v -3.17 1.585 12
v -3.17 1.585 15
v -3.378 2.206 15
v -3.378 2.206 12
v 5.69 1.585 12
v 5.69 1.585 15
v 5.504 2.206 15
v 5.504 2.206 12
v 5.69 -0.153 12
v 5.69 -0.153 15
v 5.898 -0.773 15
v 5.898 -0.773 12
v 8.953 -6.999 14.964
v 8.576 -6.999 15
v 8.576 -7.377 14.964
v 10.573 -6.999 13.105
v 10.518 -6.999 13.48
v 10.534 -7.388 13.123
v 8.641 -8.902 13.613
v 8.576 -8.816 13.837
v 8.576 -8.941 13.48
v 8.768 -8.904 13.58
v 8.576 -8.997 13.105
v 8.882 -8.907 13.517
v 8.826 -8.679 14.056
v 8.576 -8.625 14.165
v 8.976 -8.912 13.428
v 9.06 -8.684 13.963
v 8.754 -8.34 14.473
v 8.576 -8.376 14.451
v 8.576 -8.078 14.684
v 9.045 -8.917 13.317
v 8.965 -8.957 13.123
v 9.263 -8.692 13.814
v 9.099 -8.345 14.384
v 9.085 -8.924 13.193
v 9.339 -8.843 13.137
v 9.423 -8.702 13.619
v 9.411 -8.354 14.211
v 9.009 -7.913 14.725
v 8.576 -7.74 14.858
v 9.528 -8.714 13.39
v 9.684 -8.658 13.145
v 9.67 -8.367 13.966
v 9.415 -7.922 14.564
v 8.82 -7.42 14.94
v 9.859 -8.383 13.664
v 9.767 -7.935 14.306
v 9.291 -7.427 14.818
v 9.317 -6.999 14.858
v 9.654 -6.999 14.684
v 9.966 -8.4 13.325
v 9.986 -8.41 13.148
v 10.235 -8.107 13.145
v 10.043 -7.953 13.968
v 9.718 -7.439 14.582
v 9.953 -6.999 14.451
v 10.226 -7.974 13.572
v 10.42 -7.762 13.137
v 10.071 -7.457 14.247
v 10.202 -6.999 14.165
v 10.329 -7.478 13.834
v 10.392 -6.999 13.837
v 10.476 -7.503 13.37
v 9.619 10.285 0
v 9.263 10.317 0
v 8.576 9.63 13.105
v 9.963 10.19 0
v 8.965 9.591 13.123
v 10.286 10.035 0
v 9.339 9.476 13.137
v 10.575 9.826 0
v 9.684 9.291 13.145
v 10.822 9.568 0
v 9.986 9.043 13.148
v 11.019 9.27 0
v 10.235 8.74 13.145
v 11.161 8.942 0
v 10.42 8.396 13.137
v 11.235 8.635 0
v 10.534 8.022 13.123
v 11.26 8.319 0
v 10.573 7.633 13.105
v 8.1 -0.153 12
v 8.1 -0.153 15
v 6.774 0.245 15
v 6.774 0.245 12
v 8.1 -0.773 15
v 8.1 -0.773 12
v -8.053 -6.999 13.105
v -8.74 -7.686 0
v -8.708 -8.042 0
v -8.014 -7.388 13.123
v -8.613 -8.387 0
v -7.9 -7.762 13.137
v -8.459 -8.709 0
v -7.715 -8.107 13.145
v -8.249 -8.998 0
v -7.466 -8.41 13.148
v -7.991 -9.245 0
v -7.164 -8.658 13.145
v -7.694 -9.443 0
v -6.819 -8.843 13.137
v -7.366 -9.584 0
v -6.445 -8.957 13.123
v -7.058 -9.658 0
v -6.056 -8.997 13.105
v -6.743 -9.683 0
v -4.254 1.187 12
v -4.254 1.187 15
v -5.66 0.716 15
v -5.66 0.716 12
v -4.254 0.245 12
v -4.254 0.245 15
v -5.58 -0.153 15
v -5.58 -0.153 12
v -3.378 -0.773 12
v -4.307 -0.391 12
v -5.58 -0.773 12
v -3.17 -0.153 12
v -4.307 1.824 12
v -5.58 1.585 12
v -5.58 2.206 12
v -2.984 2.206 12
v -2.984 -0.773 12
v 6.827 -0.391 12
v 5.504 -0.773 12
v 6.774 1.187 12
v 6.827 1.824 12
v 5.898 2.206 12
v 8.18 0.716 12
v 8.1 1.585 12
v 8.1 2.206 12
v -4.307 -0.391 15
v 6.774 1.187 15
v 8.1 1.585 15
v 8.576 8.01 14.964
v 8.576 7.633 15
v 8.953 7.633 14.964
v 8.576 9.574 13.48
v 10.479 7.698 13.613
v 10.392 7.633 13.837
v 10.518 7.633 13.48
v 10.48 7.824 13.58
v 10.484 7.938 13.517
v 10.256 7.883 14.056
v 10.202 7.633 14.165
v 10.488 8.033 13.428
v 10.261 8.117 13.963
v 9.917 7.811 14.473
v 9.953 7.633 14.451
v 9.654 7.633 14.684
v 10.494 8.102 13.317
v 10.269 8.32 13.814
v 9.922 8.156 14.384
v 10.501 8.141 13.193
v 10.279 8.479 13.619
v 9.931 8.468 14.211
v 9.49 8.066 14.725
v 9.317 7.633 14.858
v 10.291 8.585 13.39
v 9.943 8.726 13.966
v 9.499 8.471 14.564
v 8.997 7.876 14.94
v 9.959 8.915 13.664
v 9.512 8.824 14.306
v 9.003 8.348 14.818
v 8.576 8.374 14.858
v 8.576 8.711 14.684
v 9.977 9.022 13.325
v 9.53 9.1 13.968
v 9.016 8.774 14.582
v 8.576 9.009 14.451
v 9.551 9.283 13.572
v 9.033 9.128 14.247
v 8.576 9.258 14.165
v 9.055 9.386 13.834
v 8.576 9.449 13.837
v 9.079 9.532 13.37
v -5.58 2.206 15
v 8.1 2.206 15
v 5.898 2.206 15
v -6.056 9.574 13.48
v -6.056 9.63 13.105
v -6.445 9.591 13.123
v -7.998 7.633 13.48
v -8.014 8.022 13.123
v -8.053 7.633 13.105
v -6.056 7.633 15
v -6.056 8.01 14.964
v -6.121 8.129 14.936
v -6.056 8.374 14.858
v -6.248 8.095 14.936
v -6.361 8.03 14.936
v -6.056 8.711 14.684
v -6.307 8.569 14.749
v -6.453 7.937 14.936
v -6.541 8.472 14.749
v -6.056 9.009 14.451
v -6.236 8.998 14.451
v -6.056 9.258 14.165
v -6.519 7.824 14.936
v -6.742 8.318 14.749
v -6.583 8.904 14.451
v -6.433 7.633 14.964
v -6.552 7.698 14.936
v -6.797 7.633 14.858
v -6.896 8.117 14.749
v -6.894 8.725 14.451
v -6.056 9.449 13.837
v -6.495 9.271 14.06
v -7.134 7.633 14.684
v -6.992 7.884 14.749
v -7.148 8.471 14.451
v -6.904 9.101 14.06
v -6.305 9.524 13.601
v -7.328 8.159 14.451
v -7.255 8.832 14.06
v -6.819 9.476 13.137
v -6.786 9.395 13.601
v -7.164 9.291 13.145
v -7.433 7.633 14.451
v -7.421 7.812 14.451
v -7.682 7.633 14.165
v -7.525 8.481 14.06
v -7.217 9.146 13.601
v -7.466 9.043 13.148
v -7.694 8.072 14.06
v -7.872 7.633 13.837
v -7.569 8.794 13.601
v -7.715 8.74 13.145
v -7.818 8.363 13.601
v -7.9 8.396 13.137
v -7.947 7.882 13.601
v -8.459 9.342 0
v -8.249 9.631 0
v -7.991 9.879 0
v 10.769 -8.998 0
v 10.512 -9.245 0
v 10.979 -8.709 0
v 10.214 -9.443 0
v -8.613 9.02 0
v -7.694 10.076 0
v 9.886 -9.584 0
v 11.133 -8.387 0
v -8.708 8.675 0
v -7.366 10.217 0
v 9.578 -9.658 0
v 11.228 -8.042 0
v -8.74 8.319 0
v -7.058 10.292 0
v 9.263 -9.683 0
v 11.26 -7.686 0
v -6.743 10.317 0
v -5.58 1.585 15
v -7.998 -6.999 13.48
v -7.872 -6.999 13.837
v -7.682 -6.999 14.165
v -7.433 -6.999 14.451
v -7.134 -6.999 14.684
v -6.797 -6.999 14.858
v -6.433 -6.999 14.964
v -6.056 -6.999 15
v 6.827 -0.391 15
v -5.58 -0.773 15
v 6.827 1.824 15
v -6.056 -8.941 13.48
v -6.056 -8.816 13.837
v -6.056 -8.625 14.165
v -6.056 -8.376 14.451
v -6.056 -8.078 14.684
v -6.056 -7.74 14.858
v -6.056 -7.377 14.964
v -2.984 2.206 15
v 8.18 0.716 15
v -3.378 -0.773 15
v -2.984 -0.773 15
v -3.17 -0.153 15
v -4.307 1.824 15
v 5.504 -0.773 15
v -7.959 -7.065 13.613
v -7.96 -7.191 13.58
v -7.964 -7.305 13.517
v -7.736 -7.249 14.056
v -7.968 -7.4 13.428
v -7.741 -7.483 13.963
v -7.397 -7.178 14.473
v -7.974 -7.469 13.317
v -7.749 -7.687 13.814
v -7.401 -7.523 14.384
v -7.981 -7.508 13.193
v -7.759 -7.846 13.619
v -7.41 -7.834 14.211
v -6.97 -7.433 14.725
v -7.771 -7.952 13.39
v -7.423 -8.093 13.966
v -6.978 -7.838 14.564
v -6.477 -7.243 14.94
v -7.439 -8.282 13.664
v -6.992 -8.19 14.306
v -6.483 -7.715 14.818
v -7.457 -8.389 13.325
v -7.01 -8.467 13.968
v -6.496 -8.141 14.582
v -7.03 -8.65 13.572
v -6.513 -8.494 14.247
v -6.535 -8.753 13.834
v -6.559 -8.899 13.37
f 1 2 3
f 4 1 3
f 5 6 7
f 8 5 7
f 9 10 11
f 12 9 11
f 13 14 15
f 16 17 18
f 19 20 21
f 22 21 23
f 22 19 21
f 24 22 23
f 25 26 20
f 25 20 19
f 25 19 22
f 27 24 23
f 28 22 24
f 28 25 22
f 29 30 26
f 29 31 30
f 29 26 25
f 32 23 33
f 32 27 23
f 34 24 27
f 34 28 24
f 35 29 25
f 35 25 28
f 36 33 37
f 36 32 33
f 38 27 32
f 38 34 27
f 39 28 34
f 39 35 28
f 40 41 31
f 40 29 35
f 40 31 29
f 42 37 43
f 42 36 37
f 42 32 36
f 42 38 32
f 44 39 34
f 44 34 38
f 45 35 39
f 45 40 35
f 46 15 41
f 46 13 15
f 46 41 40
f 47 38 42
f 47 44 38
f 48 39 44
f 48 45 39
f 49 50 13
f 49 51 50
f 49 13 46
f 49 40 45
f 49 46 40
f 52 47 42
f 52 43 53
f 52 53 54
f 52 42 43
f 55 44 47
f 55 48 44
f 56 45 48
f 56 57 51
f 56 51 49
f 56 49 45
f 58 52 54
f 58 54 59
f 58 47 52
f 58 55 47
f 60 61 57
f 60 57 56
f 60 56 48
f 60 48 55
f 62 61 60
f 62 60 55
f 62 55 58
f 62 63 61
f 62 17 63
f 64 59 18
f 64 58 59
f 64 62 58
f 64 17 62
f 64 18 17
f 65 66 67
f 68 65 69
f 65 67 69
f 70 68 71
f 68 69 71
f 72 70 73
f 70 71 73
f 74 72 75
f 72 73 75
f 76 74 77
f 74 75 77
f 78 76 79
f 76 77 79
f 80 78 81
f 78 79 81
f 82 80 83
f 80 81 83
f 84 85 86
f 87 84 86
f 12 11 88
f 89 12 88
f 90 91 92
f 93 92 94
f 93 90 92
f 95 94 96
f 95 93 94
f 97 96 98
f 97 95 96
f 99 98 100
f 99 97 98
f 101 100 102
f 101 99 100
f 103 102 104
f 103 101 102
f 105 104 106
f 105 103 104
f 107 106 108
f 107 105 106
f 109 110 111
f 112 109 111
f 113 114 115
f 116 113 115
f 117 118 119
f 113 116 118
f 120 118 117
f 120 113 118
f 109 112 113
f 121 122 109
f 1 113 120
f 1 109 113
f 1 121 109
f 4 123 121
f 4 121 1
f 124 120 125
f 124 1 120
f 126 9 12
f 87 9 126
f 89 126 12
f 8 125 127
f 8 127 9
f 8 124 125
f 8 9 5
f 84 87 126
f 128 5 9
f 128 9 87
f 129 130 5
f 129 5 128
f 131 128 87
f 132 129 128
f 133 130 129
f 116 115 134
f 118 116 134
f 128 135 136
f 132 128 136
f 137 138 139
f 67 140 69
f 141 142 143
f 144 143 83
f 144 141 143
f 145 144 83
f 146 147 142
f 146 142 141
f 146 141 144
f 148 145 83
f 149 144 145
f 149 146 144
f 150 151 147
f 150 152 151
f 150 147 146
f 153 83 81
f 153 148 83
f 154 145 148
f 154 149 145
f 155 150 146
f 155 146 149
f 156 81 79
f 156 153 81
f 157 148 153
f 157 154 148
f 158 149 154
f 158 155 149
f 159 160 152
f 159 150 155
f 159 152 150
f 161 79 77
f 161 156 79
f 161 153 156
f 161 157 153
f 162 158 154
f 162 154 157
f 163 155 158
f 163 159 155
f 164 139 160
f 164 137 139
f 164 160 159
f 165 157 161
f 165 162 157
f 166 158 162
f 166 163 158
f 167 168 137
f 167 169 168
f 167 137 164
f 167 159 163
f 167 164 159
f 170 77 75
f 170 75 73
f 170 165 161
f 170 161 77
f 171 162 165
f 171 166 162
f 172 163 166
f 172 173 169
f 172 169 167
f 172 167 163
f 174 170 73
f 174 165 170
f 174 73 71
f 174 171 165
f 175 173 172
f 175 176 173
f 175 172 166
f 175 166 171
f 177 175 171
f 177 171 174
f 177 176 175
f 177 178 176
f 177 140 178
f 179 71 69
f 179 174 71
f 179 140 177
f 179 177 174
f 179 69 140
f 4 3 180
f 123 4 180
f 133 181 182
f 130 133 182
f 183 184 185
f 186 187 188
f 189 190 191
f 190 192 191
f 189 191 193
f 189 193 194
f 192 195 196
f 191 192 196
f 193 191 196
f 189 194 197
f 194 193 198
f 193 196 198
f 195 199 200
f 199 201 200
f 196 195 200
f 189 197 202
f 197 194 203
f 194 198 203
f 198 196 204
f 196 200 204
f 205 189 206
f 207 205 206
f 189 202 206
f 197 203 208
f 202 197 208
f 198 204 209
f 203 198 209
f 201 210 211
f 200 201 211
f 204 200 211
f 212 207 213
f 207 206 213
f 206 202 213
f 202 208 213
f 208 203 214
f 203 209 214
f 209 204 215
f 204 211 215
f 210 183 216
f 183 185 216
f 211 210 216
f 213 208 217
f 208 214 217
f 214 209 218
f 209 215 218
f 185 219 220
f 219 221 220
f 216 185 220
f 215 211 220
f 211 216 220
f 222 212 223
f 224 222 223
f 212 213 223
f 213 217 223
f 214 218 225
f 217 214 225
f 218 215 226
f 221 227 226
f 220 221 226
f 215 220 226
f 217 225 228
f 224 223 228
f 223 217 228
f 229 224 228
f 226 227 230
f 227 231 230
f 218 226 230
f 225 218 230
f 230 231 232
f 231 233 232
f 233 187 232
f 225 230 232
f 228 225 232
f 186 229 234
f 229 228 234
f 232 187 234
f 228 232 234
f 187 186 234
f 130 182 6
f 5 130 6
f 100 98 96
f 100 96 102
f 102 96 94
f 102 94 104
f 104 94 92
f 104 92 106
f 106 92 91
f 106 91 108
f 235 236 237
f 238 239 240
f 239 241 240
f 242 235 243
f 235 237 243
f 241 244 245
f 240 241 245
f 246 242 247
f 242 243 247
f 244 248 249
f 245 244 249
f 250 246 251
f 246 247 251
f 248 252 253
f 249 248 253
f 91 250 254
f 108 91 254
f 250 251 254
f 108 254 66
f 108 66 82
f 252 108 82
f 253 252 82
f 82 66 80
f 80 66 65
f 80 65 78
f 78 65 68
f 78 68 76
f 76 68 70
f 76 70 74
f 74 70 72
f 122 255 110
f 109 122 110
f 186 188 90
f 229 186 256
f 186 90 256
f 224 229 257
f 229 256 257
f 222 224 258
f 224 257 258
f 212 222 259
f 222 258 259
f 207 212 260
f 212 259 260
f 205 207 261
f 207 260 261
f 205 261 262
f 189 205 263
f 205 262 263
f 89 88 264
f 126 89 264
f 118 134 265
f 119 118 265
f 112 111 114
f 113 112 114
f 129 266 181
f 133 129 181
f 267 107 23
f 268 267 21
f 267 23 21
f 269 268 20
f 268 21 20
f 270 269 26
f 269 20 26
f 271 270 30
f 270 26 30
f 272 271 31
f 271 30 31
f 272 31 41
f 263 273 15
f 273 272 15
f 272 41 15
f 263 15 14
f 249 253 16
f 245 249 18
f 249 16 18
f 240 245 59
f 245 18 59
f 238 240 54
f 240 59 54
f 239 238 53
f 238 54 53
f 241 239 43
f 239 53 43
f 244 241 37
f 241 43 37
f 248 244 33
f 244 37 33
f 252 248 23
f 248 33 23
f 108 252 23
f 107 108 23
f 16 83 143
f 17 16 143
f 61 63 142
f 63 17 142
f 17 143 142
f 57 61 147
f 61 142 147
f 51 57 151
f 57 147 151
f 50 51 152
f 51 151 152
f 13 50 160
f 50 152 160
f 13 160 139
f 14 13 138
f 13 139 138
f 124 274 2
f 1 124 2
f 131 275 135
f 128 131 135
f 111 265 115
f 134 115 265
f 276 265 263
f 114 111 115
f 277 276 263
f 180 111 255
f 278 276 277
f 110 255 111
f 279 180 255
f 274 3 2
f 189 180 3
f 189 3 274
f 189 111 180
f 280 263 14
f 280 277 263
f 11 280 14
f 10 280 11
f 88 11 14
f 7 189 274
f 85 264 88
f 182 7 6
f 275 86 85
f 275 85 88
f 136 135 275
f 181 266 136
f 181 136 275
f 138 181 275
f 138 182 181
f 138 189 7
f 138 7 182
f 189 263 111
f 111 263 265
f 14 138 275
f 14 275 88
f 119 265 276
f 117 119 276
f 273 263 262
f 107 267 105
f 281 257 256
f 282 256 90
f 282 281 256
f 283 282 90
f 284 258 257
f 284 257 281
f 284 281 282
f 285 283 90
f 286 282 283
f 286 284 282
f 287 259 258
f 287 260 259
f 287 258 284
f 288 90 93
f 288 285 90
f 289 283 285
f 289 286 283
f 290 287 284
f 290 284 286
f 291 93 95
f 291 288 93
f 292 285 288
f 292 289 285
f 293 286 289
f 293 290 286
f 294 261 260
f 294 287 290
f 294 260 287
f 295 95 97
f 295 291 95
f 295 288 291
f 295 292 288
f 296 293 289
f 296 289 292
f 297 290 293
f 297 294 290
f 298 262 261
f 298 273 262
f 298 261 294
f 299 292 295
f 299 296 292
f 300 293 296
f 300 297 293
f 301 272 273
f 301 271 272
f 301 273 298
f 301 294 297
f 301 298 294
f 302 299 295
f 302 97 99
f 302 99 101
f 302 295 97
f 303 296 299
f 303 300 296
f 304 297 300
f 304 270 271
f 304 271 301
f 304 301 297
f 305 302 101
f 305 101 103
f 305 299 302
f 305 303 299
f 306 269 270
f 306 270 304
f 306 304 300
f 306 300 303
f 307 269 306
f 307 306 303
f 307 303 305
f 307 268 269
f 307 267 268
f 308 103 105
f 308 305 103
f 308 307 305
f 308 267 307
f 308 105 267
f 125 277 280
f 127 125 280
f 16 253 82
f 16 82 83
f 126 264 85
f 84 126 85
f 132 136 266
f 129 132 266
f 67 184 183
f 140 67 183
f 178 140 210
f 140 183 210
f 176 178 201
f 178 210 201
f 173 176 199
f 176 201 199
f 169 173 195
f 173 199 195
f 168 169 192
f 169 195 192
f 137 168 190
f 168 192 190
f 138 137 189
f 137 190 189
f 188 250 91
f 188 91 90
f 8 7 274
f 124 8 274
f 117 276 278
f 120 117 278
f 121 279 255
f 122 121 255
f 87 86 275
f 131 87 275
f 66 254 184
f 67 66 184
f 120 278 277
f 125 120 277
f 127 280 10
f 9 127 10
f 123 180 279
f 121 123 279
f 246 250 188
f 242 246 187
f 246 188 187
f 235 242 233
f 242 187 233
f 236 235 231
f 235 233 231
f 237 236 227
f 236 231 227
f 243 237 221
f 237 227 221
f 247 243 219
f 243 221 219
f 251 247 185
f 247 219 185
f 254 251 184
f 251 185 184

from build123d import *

# Parameters (mm, degrees)
F0_W     = 20
F0_H     = 20
F1_DEPTH = 15
F1_TAPER = 3
F2_R     = 2
F4_DEPTH = 3


with BuildPart() as f1:
    # F0 (on Top) → F1 (new body)
    with BuildSketch(Plane.XY):
        with Locations((1.2600612827, 0.3166195687)):
            Rectangle(F0_W, F0_H)
    extrude(amount=F1_DEPTH, taper=F1_TAPER)

    # F2
    f2_edges = [f1.edges().sort_by_distance(p)[0] for p in [
        (-8.34688, 9.923561, 7.5),
        (1.260061, 9.530503, 15),
        (10.473945, 0.31662, 15),
        (1.260061, -8.897264, 15),
        (-7.953822, 0.31662, 15),
        (10.867002, 9.923561, 7.500009),
        (10.867003, -9.290322, 7.5),
        (-8.34688, -9.290322, 7.5),
    ]]
    fillet(f2_edges, radius=F2_R)

    # F3 (on face) → F4 (cut)
    with BuildSketch(Plane.XY.offset(15)):
        Polygon((-4.2536617257, 1.1870977469), (-5.6595876813, 0.7161942194), (-4.2536617257, 0.245290692), (-5.5800070986, -0.1526129199), (-4.3067154475, -0.3913551336), (-5.5800070986, -0.773342629), (-3.3782736864, -0.773342629), (-3.1703652909, -0.1526129199), (-2.9841463782, -0.773342629), (1.2600612827, -0.773342629), (5.5042689435, -0.773342629), (5.6904878563, -0.1526129199), (5.8983962517, -0.773342629), (8.1001296639, -0.773342629), (6.8268380128, -0.3913551336), (8.1001296639, -0.1526129199), (6.773784291, 0.245290692), (8.1797102466, 0.7161942194), (6.773784291, 1.1870977469), (8.1001296639, 1.5850013588), (6.8268380128, 1.8237435725), (8.1001296639, 2.2057310678), (5.8983962517, 2.2057310678), (5.6904878563, 1.5850013588), (5.5042689435, 2.2057310678), (1.2600612827, 2.2057310678), (-2.9841463782, 2.2057310678), (-3.1703652909, 1.5850013588), (-3.3782736864, 2.2057310678), (-5.5800070986, 2.2057310678), (-4.3067154475, 1.8237435725), (-5.5800070986, 1.5850013588), align=None)
    extrude(amount=-F4_DEPTH, mode=Mode.SUBTRACT)


solid = f1.part
